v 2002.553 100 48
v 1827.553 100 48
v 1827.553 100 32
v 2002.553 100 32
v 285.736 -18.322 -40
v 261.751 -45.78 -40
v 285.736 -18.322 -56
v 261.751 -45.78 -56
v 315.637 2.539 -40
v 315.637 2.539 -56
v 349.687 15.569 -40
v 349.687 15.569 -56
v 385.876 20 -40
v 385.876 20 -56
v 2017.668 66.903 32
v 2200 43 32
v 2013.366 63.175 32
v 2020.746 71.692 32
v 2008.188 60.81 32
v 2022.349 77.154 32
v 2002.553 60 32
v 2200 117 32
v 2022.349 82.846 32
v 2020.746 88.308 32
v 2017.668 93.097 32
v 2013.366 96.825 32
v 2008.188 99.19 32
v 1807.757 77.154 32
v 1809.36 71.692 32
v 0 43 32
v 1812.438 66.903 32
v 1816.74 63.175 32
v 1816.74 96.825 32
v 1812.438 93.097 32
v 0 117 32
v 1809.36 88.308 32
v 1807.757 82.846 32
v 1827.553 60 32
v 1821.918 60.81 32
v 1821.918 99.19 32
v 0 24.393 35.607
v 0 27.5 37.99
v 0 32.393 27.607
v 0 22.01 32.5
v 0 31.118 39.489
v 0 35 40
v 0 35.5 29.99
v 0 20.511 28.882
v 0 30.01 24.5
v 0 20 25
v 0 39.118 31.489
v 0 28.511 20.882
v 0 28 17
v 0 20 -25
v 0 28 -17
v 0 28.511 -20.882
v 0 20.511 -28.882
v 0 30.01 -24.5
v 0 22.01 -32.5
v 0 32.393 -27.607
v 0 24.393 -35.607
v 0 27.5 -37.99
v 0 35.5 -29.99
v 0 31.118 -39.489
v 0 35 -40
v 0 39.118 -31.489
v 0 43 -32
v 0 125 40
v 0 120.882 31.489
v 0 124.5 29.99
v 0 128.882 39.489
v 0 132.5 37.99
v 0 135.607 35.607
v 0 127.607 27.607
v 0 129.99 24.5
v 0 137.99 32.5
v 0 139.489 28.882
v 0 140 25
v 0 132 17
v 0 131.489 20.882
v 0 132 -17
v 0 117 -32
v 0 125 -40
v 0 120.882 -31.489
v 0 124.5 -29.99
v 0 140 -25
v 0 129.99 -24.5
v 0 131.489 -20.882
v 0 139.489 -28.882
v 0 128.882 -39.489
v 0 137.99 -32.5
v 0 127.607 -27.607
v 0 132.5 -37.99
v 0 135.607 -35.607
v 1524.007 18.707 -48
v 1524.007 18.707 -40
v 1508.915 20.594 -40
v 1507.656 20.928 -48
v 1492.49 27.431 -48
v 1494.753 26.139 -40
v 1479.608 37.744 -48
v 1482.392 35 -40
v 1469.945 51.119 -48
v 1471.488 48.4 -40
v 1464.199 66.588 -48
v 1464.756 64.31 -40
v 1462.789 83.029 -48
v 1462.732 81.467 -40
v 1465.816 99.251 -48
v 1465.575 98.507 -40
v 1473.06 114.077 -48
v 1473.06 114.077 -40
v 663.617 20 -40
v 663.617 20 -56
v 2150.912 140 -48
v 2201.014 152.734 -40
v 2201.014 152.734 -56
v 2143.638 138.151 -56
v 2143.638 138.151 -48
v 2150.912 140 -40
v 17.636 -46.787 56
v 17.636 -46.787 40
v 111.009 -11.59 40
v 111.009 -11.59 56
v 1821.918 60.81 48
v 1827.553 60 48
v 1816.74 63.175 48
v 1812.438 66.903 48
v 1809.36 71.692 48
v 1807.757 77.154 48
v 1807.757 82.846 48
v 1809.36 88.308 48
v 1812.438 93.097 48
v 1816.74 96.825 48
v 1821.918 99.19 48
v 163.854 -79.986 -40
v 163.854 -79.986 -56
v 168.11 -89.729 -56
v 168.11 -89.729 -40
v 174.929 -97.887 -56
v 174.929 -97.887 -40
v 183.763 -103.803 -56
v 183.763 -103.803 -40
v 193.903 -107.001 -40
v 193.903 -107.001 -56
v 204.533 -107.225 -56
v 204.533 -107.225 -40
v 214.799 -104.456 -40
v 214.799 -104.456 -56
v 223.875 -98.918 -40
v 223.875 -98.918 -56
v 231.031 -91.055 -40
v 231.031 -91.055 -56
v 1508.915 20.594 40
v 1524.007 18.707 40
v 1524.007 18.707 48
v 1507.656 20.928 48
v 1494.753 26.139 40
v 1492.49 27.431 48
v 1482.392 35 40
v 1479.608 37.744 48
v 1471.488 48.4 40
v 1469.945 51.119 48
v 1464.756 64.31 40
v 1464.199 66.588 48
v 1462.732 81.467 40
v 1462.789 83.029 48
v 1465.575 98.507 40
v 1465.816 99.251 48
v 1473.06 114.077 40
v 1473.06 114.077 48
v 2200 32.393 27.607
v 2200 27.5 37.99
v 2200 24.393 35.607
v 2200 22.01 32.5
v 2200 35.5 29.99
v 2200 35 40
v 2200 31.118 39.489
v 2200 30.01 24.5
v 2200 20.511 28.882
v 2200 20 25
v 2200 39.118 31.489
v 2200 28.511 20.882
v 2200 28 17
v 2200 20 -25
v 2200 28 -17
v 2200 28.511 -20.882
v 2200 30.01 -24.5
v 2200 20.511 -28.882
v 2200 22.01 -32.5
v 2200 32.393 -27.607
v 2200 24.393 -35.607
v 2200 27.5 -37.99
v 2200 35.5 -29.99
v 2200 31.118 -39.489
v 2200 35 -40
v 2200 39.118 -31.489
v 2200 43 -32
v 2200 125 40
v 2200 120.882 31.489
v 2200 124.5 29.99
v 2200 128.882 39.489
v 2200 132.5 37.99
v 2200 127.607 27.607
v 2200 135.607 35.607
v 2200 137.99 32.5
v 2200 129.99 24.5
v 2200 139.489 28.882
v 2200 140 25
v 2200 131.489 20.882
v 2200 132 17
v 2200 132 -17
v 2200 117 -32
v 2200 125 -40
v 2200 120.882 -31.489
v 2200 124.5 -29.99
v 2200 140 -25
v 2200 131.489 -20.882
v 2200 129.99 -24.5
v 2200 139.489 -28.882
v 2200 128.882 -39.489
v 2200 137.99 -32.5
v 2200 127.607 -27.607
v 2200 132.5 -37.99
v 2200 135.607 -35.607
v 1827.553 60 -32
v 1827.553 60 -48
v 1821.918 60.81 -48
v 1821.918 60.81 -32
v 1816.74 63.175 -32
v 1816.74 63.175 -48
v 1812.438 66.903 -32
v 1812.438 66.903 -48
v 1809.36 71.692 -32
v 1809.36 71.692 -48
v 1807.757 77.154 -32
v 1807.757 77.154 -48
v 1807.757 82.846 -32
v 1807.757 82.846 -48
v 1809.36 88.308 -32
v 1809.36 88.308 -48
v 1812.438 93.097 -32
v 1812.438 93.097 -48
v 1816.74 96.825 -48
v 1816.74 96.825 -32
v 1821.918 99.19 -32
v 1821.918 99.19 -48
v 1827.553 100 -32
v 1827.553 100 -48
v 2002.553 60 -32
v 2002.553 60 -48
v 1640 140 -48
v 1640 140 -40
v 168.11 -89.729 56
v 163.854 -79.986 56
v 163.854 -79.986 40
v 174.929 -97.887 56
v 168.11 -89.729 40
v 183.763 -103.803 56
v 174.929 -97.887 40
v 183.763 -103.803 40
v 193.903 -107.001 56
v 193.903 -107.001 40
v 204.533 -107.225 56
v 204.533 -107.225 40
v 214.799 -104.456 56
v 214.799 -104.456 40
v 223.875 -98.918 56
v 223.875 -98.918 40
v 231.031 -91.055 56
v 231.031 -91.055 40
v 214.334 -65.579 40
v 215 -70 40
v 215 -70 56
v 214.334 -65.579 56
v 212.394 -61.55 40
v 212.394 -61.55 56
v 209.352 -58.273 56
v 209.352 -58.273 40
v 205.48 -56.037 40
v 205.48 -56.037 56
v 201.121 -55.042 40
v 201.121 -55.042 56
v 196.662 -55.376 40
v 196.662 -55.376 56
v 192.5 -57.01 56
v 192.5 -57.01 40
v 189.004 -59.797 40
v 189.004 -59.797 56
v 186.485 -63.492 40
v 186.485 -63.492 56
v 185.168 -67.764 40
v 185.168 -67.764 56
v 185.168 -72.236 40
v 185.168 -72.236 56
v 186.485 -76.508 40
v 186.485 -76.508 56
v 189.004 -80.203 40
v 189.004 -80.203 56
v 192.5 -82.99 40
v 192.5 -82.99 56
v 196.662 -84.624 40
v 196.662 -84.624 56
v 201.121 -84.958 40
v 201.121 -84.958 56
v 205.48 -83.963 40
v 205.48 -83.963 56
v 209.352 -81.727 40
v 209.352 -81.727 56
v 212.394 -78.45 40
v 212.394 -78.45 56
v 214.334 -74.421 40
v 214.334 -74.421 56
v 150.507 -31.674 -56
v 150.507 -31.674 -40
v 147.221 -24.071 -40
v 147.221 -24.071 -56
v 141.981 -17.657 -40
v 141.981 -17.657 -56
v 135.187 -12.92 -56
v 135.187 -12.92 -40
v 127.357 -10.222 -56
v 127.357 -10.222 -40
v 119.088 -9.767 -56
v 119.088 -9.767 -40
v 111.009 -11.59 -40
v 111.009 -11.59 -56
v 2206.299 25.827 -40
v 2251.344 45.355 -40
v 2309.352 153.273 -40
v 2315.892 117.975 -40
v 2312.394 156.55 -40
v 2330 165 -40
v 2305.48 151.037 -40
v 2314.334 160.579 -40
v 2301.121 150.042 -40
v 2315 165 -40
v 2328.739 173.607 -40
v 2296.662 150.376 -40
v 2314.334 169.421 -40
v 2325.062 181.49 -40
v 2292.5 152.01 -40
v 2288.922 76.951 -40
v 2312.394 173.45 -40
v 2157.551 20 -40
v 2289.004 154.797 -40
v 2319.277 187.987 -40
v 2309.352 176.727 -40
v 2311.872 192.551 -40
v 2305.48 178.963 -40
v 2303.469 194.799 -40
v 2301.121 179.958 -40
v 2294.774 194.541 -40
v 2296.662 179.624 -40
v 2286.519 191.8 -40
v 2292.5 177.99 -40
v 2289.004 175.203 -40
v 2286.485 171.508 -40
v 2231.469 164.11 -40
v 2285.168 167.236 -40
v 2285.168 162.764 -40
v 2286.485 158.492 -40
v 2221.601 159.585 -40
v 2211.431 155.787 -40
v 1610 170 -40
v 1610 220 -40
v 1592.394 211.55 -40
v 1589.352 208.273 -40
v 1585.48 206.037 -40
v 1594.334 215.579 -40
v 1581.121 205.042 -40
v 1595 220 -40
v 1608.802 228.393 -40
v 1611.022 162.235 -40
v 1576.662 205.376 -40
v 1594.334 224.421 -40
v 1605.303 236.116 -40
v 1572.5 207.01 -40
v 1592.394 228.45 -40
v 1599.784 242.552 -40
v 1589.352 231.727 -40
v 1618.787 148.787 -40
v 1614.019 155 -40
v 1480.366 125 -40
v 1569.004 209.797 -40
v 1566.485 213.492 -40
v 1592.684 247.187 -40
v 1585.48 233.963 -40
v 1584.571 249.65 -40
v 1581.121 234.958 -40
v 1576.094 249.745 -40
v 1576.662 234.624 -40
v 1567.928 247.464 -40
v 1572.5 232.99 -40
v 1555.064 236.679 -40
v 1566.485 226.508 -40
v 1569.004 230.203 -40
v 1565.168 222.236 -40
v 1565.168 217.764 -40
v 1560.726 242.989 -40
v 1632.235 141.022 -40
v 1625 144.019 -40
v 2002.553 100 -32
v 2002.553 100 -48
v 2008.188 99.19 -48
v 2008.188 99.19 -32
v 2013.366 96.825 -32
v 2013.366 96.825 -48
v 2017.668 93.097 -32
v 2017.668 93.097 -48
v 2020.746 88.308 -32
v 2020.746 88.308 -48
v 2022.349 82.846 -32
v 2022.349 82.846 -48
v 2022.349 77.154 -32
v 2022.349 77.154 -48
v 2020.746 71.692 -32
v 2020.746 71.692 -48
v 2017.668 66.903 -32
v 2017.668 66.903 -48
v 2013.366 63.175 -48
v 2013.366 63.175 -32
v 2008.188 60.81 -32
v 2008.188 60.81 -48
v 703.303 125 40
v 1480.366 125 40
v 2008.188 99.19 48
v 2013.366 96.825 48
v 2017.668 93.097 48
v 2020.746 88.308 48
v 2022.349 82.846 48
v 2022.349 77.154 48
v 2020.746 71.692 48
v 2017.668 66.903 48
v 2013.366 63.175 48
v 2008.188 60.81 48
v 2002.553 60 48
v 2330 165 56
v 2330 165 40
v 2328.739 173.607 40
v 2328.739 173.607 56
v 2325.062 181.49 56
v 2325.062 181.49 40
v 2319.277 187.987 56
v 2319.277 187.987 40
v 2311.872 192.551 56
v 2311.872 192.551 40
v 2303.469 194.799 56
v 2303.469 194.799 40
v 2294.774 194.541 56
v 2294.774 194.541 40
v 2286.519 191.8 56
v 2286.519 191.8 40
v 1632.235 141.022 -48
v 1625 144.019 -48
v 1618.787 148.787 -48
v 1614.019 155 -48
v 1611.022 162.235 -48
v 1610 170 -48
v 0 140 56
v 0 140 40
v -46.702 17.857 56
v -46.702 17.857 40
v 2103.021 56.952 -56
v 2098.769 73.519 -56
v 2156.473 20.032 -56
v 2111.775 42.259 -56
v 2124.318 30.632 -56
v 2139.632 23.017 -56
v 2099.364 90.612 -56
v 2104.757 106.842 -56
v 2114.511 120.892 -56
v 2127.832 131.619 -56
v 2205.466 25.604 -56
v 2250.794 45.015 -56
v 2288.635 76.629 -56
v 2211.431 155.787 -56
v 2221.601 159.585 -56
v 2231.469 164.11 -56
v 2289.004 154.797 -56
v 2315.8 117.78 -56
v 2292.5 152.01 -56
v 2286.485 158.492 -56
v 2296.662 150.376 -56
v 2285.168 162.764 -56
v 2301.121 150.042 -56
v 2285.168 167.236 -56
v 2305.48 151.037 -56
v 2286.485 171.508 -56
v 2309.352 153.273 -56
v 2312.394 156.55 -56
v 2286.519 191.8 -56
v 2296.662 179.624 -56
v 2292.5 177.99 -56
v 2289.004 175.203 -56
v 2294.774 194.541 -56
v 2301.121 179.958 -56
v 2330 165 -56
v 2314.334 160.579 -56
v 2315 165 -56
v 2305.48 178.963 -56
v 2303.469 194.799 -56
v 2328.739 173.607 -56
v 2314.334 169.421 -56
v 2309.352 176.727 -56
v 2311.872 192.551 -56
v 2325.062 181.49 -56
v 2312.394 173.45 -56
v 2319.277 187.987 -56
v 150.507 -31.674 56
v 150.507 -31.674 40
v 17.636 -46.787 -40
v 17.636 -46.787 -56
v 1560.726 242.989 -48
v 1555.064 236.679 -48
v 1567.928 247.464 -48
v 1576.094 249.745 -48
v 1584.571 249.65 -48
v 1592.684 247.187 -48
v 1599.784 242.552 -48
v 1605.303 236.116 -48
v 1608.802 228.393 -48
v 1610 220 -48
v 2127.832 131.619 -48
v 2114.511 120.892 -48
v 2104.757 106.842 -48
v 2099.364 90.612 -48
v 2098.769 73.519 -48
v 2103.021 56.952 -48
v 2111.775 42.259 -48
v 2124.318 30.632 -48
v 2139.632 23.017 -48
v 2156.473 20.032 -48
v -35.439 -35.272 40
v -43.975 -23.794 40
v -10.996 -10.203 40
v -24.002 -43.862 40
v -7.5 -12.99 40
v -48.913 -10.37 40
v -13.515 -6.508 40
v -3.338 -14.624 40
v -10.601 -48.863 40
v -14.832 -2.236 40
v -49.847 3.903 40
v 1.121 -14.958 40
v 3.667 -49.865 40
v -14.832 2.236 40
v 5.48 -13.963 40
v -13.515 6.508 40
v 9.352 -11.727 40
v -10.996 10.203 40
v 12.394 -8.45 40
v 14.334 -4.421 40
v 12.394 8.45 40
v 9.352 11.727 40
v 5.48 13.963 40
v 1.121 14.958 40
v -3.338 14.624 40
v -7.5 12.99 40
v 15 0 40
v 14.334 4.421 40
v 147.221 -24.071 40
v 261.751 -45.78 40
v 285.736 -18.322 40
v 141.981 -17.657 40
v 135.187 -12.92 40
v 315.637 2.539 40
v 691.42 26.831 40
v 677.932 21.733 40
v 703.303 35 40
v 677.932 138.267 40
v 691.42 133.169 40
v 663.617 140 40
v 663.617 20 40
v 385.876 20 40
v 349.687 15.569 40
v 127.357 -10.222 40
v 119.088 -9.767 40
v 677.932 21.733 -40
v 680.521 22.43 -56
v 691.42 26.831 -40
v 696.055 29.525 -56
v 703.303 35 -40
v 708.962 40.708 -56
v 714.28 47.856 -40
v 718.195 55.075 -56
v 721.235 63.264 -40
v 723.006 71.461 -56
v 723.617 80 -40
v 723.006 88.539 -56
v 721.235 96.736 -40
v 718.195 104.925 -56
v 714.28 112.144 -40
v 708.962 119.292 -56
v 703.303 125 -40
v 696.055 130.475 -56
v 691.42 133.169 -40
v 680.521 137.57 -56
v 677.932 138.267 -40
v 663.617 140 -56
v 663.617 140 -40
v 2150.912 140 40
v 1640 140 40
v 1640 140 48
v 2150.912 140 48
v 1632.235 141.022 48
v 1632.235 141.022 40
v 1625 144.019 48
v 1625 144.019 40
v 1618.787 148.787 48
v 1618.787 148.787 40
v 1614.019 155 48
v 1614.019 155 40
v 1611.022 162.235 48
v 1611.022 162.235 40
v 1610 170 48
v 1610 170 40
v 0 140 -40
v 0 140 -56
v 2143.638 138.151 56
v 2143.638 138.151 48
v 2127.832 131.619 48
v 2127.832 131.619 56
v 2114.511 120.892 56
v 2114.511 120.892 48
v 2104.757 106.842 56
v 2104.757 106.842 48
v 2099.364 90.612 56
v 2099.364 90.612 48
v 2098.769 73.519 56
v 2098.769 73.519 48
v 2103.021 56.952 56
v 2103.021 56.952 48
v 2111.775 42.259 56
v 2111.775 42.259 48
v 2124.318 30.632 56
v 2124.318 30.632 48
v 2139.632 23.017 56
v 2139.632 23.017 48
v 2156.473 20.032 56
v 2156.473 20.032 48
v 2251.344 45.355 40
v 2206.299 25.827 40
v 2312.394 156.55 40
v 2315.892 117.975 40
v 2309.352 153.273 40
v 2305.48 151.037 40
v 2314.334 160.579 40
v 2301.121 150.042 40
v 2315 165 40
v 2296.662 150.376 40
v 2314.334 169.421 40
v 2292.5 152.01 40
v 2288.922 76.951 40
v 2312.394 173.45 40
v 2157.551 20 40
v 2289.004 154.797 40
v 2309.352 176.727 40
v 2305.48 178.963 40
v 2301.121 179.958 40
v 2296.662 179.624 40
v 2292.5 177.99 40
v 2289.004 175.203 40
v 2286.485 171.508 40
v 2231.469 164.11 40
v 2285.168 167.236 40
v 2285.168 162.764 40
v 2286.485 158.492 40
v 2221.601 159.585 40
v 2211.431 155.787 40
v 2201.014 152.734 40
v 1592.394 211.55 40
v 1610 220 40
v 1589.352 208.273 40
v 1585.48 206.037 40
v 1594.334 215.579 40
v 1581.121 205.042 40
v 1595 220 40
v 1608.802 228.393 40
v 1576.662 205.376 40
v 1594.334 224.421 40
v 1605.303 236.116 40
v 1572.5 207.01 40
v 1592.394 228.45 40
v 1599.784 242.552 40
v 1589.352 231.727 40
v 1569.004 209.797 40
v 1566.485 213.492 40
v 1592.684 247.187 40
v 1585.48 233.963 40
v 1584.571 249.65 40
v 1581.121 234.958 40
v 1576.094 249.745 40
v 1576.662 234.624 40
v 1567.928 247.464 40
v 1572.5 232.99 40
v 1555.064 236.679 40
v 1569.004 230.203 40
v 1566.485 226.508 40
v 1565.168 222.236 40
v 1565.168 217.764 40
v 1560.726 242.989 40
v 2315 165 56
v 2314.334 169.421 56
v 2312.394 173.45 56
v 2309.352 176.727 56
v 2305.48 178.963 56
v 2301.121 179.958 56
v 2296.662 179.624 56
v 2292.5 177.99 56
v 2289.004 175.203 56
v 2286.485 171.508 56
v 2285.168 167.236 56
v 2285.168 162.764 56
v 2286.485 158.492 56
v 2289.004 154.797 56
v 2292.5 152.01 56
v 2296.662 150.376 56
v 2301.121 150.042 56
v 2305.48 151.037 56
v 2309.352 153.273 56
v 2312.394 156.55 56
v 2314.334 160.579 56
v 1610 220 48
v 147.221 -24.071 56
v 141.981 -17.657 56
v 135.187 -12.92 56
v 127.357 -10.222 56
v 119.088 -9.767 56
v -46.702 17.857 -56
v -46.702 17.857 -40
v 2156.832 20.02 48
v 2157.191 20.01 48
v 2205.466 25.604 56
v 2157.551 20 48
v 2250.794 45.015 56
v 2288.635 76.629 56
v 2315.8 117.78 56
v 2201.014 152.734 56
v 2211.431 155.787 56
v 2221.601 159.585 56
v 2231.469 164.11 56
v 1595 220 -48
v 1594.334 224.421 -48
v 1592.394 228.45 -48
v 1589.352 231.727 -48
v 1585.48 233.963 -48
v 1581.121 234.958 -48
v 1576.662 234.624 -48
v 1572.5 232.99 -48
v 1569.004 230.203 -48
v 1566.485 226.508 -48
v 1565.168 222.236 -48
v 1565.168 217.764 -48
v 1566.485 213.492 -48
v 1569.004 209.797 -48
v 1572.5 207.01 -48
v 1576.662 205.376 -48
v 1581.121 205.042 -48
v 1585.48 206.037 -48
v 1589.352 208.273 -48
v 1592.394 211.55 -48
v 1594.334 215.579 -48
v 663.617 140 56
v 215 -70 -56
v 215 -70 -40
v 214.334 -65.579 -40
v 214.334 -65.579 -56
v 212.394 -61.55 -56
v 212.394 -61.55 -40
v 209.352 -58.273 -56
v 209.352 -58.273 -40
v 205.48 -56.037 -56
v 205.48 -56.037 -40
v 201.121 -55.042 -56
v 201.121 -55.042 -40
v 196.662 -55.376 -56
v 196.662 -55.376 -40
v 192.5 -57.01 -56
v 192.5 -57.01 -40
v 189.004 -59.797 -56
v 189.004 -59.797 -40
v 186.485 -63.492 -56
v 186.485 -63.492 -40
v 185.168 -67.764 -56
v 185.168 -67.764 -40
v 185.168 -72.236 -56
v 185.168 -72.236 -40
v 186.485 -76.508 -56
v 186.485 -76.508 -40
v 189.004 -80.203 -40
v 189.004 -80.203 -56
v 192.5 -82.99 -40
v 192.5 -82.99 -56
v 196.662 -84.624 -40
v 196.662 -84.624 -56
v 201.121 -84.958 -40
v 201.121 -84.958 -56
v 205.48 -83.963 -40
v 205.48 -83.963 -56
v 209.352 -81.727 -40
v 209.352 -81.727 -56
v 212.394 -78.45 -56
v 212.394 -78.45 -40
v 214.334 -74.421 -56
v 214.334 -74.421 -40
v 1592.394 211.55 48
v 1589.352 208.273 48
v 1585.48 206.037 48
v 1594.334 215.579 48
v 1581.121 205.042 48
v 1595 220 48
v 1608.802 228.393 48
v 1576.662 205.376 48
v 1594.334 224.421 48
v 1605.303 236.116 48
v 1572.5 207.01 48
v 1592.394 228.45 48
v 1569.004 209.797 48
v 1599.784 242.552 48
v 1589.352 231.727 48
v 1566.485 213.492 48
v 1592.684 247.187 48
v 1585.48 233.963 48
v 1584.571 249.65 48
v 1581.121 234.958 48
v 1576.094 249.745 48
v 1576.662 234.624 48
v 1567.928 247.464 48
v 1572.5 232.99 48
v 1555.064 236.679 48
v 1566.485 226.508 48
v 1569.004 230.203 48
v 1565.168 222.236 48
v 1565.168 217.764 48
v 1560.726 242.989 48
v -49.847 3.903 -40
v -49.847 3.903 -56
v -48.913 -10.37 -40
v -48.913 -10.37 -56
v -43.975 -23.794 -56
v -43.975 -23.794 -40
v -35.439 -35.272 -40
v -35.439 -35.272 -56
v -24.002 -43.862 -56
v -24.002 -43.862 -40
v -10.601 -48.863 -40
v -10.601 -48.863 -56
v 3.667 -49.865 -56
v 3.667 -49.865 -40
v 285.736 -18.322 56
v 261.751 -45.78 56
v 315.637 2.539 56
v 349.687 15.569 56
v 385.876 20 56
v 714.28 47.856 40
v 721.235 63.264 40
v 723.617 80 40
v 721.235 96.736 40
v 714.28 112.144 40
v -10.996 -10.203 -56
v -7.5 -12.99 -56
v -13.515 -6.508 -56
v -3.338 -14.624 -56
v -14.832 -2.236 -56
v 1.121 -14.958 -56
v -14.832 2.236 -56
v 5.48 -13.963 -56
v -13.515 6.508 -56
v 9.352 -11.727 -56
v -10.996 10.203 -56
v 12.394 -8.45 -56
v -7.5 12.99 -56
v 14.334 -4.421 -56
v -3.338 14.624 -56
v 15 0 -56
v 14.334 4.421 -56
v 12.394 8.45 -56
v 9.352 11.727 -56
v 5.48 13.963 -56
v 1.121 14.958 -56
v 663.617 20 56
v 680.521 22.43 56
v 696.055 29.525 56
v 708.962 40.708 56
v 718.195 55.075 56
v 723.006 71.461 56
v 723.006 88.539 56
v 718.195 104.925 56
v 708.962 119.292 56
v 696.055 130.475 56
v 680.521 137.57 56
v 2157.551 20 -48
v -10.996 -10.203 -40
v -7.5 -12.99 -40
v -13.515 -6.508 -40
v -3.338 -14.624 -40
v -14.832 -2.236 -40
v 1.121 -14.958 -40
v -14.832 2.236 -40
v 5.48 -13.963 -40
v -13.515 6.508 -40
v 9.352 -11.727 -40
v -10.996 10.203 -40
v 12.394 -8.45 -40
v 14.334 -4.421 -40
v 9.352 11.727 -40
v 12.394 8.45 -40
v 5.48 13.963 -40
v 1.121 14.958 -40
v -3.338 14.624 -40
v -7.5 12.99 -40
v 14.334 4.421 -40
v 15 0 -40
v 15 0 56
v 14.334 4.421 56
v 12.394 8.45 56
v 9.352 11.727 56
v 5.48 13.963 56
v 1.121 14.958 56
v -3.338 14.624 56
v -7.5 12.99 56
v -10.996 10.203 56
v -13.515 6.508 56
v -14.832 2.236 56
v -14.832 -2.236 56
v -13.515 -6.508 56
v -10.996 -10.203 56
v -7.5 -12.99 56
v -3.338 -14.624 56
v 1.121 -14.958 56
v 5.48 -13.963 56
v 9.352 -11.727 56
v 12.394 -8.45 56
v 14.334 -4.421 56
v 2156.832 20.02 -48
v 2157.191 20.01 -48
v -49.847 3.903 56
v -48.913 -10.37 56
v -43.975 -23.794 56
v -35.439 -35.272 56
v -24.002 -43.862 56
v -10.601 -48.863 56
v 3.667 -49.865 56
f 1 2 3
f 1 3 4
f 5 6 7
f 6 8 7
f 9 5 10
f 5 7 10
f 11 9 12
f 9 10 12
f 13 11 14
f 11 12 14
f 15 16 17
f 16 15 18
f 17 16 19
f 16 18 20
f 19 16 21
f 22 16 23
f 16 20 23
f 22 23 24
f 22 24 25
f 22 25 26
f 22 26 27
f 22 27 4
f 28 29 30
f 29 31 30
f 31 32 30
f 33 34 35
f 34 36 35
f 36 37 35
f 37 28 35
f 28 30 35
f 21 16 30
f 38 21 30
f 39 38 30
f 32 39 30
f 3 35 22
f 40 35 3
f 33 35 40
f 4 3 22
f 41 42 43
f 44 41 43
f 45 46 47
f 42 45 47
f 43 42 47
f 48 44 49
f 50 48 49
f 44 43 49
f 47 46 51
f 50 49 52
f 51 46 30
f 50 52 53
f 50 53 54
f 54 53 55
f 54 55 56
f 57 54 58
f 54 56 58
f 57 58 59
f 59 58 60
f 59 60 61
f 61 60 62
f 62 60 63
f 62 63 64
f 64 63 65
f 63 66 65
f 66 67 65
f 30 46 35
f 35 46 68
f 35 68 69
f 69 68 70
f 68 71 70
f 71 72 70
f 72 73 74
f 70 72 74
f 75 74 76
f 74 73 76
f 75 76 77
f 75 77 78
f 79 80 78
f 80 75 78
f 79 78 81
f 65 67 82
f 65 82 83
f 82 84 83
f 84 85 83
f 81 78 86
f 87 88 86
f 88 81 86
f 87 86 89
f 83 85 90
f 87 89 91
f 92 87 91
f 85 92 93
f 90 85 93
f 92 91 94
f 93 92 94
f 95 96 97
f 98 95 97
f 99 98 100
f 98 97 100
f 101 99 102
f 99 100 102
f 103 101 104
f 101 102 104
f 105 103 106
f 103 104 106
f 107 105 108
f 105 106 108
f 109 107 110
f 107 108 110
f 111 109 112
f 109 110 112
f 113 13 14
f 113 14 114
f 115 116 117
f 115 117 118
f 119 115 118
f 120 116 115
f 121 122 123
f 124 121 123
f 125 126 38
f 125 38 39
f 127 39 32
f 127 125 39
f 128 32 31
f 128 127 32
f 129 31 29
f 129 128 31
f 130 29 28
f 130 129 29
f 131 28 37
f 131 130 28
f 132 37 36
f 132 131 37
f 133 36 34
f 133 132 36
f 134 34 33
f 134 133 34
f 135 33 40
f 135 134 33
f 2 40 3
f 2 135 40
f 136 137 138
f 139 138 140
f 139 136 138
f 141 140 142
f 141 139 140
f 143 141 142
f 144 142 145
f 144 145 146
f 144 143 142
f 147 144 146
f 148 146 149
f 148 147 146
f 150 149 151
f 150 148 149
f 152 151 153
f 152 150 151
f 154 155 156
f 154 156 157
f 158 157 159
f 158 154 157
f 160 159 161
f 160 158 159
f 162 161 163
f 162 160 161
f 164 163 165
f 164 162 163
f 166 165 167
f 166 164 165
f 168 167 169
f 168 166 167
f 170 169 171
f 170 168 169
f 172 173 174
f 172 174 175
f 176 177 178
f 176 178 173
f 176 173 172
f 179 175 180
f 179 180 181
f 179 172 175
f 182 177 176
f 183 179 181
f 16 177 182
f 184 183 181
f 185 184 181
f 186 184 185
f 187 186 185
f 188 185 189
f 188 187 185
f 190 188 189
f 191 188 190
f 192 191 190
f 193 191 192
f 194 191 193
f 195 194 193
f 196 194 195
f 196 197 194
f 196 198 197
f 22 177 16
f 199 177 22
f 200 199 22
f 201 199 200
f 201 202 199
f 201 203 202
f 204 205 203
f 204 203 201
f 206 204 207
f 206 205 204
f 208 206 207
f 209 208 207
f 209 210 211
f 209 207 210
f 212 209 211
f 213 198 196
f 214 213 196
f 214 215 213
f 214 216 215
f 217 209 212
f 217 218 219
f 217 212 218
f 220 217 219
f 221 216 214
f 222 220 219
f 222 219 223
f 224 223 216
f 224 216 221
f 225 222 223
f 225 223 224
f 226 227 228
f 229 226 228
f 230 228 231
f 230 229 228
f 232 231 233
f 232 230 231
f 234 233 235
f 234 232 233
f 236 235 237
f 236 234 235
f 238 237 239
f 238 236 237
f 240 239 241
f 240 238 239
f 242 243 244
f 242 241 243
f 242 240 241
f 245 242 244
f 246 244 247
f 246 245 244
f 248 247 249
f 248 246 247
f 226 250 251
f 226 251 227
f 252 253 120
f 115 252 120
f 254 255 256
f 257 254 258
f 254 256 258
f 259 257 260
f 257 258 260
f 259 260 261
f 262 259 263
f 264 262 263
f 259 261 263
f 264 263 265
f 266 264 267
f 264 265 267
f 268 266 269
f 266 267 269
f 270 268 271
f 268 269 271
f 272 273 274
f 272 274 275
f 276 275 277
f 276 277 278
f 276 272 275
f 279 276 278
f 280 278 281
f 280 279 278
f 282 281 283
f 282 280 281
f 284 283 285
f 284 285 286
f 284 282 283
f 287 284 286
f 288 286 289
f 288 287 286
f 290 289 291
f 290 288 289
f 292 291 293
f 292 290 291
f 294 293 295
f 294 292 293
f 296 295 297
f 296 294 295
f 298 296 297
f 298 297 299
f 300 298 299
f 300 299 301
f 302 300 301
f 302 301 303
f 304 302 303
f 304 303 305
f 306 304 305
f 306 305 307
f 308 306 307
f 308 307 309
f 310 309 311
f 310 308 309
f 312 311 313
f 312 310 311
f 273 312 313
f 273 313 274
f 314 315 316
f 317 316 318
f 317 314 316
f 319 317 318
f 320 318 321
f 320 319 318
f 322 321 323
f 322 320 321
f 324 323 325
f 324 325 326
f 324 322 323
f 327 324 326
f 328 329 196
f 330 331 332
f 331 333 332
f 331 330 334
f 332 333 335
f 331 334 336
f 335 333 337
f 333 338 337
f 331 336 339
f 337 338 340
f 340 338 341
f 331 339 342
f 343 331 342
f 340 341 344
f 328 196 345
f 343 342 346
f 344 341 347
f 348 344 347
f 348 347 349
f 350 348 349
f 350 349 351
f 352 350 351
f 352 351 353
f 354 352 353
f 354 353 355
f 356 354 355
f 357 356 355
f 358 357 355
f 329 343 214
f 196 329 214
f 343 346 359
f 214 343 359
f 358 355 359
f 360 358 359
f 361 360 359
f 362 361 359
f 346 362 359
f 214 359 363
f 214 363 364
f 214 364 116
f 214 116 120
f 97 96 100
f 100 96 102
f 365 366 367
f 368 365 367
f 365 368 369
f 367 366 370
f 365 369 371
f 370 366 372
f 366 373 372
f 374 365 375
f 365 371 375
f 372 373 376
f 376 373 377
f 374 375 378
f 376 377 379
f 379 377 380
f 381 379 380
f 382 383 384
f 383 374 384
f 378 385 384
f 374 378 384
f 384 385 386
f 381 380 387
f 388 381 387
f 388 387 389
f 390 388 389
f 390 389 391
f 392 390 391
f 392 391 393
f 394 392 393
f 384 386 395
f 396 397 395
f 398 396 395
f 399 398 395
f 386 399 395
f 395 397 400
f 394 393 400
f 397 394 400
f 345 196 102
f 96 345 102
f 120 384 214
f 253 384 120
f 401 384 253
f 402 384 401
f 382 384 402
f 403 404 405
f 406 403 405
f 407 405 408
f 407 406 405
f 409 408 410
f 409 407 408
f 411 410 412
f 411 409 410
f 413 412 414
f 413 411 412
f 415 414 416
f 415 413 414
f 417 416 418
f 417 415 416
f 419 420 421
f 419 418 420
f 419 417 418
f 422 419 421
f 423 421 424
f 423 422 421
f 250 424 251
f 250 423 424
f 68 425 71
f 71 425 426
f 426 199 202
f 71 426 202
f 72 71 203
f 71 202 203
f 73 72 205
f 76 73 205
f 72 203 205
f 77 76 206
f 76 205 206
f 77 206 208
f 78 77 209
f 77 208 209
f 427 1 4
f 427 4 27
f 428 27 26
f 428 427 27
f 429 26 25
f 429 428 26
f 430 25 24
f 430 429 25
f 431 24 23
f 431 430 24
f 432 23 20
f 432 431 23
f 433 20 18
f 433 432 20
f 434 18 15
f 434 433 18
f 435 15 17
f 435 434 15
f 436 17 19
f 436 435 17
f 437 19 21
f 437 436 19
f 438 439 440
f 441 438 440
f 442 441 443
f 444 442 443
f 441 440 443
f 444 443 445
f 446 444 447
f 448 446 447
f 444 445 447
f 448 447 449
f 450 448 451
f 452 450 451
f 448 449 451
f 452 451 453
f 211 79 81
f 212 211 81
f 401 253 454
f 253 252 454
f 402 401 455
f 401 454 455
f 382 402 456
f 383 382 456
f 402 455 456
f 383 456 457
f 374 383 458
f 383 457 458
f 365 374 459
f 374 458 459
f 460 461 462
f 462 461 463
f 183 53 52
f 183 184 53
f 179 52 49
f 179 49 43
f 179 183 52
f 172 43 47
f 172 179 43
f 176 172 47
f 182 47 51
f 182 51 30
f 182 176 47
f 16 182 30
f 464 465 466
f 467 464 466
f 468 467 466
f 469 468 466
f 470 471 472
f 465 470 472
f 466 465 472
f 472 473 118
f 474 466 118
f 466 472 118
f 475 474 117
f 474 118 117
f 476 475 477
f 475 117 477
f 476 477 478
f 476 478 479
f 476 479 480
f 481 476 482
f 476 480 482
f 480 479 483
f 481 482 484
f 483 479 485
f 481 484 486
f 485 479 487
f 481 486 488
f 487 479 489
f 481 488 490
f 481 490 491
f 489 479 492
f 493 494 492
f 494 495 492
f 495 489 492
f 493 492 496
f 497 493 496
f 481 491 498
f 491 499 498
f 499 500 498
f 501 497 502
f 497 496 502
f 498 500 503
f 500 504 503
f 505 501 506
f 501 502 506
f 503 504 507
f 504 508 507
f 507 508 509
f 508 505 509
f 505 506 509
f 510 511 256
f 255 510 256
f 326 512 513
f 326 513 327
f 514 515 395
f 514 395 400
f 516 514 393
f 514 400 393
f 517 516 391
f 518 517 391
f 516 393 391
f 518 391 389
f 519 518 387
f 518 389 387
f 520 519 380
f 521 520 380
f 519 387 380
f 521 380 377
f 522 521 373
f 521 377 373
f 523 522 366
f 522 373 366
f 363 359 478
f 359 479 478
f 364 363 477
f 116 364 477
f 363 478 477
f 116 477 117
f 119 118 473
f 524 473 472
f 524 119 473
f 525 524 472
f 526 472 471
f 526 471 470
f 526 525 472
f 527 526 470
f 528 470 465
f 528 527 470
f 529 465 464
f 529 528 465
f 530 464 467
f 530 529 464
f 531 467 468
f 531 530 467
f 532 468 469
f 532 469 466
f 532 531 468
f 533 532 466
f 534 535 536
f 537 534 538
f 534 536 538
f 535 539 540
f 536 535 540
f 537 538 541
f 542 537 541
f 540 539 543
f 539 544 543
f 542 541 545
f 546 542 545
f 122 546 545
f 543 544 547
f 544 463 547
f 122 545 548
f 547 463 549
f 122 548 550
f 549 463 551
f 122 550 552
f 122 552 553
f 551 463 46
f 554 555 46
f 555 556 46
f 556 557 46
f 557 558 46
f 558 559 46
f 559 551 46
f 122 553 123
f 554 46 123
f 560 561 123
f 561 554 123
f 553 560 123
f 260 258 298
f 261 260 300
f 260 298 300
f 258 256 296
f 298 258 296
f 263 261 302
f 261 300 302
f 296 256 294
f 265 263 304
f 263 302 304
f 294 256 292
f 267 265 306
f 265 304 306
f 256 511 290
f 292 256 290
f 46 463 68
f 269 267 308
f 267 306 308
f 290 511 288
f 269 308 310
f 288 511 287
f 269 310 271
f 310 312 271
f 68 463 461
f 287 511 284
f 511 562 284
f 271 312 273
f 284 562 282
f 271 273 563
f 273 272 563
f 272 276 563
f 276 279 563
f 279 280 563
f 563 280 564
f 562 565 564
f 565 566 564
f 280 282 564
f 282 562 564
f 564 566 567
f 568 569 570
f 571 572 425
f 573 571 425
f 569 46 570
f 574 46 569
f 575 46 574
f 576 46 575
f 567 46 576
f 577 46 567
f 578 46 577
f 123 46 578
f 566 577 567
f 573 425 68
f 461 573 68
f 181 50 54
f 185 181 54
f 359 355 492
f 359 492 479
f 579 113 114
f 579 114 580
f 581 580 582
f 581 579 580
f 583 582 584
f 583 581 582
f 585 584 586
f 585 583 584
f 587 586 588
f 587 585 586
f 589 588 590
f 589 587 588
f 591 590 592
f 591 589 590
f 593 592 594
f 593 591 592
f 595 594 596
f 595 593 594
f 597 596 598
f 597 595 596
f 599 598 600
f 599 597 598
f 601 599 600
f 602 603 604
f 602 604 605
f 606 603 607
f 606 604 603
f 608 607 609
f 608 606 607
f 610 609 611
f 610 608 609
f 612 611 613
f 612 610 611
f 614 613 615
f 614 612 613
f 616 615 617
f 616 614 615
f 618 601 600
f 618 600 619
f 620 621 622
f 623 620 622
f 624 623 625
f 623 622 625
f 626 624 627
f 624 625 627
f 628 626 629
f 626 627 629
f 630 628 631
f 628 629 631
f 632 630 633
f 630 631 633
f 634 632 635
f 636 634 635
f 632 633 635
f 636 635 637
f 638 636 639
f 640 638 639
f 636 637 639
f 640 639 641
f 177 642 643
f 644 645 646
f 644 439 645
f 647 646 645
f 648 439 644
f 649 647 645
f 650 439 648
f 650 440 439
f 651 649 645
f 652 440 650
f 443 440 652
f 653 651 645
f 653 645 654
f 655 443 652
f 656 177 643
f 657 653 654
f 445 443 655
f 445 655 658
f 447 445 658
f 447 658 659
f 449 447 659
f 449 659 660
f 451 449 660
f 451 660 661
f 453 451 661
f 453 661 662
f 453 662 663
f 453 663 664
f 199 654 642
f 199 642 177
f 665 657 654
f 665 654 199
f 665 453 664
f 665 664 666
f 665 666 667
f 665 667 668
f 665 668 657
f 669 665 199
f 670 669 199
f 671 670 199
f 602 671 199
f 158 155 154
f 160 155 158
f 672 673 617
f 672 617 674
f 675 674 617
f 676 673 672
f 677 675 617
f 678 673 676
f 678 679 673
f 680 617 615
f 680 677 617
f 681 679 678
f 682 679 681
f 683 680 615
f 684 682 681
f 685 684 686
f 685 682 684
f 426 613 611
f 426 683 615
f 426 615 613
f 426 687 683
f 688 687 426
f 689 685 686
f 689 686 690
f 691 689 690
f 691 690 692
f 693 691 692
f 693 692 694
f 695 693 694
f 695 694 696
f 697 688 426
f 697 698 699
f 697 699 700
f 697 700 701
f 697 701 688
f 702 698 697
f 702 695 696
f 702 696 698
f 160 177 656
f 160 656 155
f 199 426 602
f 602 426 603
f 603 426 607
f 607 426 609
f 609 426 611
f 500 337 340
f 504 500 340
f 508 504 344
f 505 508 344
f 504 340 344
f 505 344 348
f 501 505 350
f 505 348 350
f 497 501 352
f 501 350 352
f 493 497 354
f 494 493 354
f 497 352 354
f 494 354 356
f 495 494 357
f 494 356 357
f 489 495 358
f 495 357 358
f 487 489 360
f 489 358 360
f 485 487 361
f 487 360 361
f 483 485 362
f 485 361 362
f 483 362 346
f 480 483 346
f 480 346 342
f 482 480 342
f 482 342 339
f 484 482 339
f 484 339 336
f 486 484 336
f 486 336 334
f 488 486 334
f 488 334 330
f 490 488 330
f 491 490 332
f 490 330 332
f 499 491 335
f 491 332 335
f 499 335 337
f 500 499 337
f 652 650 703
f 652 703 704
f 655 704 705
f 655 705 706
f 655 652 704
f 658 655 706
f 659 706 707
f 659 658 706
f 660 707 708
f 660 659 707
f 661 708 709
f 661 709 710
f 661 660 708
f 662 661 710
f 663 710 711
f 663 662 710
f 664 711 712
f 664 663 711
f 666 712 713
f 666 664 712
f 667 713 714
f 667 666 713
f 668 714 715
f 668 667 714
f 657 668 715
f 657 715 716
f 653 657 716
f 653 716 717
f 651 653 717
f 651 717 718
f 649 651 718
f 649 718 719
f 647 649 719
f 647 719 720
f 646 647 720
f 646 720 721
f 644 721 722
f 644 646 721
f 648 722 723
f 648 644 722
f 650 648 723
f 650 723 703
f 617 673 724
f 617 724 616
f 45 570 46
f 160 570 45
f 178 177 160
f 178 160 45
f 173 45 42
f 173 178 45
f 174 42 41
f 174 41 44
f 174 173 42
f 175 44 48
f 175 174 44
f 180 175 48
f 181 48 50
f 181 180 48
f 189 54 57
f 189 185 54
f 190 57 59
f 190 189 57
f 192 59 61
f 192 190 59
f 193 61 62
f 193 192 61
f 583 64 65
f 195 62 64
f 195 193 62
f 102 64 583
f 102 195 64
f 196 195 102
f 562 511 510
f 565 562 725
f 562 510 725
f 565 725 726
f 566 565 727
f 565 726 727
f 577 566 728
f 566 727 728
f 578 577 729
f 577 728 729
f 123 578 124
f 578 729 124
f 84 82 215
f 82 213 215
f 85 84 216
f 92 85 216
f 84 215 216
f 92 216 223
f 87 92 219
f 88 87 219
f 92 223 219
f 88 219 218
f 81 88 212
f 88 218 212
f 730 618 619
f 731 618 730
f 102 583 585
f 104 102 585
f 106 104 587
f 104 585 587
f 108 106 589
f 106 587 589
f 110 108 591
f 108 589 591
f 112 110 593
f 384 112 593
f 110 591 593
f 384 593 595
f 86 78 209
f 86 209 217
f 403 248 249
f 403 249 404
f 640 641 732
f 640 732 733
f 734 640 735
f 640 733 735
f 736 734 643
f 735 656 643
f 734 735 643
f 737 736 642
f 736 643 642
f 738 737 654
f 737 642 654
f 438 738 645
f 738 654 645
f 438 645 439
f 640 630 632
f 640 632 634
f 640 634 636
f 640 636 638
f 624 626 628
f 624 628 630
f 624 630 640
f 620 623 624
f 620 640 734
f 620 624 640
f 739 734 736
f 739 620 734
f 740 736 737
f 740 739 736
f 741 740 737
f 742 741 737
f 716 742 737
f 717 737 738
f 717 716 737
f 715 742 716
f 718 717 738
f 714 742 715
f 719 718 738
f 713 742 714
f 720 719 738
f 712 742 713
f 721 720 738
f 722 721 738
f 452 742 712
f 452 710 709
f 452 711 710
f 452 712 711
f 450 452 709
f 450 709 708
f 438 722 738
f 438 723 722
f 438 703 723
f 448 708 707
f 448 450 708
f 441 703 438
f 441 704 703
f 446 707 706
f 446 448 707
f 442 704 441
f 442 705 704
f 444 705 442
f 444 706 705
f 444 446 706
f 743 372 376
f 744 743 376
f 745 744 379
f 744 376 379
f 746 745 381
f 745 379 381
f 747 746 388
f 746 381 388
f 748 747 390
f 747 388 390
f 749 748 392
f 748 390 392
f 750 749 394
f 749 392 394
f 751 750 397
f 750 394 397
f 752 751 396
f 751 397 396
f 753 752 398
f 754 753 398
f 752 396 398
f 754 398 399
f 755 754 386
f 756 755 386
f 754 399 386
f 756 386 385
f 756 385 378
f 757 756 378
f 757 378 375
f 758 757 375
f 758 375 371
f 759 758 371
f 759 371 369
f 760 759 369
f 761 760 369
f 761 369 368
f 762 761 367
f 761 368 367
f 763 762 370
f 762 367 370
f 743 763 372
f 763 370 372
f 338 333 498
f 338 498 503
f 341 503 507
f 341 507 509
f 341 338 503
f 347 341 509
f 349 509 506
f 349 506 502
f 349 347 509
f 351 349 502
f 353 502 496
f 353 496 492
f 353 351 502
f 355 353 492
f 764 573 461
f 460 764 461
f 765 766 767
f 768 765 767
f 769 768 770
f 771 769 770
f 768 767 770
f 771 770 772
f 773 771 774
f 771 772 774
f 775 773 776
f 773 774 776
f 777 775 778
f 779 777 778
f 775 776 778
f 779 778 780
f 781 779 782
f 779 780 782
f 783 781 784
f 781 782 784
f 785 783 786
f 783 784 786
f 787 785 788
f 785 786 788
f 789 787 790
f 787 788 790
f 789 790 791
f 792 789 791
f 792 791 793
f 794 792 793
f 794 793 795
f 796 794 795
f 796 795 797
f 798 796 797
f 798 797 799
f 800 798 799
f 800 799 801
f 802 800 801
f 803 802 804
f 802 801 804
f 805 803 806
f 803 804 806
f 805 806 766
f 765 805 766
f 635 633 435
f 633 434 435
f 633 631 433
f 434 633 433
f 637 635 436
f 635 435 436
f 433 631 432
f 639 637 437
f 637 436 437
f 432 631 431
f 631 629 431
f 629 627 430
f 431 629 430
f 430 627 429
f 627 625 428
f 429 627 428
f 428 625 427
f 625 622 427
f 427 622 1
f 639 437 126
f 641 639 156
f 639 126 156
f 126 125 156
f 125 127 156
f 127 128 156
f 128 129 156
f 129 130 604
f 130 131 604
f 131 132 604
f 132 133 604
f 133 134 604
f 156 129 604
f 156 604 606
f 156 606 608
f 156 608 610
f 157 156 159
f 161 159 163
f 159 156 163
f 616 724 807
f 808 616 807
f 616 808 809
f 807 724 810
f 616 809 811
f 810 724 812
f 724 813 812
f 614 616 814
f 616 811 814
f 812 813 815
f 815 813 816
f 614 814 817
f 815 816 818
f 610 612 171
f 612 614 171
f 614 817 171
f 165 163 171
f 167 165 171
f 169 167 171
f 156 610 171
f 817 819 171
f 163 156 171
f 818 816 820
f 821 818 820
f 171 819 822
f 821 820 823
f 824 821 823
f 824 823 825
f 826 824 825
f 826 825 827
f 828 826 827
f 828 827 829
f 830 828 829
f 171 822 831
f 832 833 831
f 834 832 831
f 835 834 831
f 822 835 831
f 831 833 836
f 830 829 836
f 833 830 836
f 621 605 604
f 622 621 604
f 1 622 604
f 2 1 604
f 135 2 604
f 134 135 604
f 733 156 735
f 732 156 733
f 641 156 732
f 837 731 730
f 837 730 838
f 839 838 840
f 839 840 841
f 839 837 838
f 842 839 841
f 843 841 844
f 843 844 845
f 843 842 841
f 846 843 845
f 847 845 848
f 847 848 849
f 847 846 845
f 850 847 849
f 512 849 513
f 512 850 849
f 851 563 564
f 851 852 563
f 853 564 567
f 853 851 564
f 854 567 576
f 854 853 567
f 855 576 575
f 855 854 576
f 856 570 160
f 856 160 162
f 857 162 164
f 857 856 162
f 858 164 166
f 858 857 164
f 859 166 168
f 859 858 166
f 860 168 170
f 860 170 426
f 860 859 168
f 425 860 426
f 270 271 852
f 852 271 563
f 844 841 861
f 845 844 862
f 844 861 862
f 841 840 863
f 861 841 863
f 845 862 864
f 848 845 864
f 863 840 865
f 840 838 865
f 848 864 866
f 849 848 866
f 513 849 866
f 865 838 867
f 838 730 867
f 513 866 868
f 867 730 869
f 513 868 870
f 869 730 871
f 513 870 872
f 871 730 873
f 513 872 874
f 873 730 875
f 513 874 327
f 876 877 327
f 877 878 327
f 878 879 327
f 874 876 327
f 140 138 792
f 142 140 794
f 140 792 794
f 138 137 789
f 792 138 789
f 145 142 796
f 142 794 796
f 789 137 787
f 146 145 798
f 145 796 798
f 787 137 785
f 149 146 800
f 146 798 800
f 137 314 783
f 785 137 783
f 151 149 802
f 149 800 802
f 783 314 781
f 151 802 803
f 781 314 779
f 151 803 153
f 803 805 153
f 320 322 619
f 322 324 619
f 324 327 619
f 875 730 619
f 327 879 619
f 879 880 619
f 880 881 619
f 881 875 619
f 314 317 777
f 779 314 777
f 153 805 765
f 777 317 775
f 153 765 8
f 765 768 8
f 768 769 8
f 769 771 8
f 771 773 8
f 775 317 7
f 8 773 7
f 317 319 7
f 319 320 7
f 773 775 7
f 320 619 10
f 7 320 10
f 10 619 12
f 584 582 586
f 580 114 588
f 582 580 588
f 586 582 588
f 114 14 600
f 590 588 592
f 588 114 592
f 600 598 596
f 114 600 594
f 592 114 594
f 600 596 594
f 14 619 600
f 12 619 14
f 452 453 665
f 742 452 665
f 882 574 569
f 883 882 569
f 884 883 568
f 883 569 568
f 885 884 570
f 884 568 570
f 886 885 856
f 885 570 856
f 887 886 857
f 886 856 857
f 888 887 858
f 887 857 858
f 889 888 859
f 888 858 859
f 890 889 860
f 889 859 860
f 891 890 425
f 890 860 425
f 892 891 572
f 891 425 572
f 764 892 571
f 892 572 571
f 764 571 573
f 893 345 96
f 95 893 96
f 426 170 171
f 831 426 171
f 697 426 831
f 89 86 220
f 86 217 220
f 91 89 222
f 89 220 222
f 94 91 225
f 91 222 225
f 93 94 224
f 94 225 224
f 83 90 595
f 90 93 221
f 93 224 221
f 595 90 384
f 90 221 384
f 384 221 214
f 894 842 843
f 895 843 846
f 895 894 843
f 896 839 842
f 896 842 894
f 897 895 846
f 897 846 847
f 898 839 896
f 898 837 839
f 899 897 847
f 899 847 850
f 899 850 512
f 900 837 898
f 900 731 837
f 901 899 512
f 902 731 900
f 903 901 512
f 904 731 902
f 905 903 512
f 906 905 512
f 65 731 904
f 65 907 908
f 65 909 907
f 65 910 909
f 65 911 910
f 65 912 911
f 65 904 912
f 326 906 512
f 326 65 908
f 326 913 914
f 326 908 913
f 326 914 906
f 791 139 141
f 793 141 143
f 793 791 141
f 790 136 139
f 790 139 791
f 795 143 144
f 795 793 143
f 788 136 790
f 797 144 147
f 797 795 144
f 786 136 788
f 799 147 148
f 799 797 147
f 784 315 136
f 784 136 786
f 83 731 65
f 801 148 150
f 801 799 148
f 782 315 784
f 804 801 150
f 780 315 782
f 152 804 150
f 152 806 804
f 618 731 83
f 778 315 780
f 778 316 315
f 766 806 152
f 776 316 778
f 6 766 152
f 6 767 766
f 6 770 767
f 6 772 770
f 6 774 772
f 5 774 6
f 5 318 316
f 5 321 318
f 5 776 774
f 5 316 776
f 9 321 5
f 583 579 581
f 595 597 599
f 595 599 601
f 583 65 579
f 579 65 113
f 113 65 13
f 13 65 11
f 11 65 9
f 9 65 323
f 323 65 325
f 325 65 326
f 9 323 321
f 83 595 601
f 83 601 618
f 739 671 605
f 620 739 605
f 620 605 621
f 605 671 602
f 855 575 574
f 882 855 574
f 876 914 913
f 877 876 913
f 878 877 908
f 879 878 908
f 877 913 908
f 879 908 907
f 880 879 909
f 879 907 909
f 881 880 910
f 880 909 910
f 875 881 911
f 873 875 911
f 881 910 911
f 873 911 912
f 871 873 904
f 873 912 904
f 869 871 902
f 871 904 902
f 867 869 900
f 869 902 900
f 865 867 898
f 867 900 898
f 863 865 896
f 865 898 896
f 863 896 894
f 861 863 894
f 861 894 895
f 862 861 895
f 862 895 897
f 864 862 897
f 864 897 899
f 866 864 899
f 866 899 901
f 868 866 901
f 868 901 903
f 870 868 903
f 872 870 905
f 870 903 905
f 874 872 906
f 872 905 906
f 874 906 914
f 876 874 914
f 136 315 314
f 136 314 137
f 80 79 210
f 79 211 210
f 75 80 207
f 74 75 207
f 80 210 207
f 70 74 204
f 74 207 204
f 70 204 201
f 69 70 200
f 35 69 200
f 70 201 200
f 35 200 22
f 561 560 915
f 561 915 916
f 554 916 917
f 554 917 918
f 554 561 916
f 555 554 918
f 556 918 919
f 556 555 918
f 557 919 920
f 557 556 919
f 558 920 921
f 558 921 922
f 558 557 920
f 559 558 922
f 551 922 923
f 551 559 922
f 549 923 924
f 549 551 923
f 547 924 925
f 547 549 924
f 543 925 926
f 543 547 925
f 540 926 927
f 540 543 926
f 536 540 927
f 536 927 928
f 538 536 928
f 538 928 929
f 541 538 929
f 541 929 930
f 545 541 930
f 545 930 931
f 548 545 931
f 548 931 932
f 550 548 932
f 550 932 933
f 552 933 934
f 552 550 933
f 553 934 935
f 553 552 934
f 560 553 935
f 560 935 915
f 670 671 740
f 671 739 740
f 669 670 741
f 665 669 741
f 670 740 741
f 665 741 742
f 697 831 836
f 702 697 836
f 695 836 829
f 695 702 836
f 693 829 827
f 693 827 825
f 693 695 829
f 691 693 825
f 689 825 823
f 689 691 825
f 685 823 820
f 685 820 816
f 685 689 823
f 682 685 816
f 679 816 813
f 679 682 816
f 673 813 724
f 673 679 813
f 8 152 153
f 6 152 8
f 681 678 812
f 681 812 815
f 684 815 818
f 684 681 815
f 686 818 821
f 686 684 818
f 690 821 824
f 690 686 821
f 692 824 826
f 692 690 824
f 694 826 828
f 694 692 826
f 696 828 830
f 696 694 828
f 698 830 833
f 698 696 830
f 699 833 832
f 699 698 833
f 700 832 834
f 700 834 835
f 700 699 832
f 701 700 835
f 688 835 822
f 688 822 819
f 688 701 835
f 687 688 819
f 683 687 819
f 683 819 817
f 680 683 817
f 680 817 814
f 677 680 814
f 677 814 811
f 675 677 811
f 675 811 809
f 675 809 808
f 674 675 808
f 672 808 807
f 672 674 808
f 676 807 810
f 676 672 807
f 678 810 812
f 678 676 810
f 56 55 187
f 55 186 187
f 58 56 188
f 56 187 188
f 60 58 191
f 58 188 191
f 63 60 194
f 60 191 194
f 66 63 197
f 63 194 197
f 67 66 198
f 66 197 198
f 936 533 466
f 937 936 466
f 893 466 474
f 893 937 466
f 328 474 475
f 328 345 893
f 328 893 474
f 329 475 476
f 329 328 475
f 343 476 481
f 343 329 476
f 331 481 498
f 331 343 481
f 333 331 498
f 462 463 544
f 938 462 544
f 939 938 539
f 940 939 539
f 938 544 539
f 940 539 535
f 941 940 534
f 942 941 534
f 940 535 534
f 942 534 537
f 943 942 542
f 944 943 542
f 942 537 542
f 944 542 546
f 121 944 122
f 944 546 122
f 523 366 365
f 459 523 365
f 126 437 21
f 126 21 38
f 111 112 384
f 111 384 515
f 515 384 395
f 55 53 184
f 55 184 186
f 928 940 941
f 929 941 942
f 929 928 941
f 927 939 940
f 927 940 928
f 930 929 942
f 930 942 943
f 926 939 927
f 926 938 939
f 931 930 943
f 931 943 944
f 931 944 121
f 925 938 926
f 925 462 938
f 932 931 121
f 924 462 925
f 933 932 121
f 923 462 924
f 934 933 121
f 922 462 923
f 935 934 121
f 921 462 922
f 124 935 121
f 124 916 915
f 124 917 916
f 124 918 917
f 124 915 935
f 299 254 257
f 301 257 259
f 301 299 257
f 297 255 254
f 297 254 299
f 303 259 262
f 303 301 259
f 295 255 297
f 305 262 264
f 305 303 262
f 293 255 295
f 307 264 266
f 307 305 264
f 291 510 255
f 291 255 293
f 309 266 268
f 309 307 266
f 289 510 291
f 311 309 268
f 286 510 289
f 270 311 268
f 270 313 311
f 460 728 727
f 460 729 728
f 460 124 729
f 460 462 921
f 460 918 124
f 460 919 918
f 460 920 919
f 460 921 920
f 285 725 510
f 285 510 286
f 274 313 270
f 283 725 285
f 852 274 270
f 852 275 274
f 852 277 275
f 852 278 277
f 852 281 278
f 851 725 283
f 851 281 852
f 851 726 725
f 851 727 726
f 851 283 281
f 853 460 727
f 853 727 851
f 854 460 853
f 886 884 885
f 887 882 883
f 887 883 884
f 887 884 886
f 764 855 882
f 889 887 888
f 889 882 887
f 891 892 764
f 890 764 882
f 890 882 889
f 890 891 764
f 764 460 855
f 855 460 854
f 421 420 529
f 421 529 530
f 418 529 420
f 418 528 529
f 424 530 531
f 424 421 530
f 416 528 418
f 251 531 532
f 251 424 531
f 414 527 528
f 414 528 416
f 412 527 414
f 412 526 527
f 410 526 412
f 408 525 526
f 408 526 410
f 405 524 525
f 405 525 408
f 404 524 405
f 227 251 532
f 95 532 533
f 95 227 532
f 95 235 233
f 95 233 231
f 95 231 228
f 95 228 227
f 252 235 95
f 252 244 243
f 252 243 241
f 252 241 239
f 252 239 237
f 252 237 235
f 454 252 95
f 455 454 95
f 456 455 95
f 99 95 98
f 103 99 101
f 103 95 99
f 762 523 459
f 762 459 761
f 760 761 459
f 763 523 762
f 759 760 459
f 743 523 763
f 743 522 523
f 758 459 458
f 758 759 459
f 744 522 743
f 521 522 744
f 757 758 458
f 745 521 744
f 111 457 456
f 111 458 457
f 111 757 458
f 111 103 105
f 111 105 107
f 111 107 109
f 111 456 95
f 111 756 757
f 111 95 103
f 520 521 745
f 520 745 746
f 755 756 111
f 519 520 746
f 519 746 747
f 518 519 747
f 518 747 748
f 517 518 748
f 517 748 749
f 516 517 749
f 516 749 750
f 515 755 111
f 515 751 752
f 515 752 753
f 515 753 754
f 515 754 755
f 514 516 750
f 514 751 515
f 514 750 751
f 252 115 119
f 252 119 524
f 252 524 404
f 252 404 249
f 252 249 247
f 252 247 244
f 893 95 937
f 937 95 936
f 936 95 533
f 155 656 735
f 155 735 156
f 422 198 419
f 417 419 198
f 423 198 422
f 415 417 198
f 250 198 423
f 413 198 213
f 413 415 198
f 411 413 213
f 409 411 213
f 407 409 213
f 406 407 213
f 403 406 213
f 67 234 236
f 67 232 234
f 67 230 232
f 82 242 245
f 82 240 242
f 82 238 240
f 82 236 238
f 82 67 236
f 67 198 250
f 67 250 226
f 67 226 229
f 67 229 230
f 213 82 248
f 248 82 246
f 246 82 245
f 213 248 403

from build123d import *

# Parameters (mm, degrees)
SKETCH2_W               = 80
SKETCH2_H               = 120
SKETCH2_W_2             = 64
SKETCH2_H_2             = 104
BOSS_EXTRUDE1_DEPTH     = 2200
FILLET4_R               = 15
SKETCH4_R               = 15
BOSS_EXTRUDE2_DEPTH     = 16
FILLET1_R               = 30
FILLET2_R               = 150
FILLET1_OF_MIRROR1_R    = 30
FILLET2_OF_MIRROR1_R    = 150
SKETCH5_R               = 15
BOSS_EXTRUDE3_DEPTH     = 16
FILLET3_R               = 150
SKETCH9_R               = 15
BOSS_EXTRUDE4_DEPTH     = 8
FILLET5_R               = 30
FILLET3_OF_MIRROR5_R    = 150
FILLET5_OF_MIRROR5_R    = 30
CUT_EXTRUDE1_DEPTH      = 17
CUT_EXTRUDE1_DEPTH_BACK = 97


with BuildPart() as part:
    # Sketch2 → Boss-Extrude1 (new body)
    with BuildSketch(Plane(origin=(0, 0, 0), x_dir=(0, 0, -1), z_dir=(1, 0, 0))):
        with Locations((0, 80)):
            Rectangle(SKETCH2_W, SKETCH2_H)
        with Locations((0, 80)):
            Rectangle(SKETCH2_W_2, SKETCH2_H_2, mode=Mode.SUBTRACT)
    extrude(amount=BOSS_EXTRUDE1_DEPTH)

    # Fillet4
    fillet4_edges = [part.edges().sort_by_distance(p)[0] for p in [
        (1100, 132, 32),
        (1100, 28, 32),
        (1100, 28, -32),
        (1100, 132, -32),
        (1100, 20, -40),
        (1100, 20, 40),
        (1100, 140, 40),
        (1100, 140, -40),
    ]]
    fillet(fillet4_edges, radius=FILLET4_R)

    # Sketch4 → Boss-Extrude2 (add)
    with BuildSketch(Plane.XY.offset(40)):
        with BuildLine():
            Line((663.616754147, 140), (0, 140))
            Line((0, 140), (-46.702488681, 17.857142857))
            ThreePointArc((-46.702488681, 17.857142857), (-35.438939598, -35.271540371), (17.635818001, -46.786514333))
            Line((17.635818001, -46.786514333), (141.756963012, 0))
            Line((141.756963012, 0), (163.853984354, -79.985767518))
            ThreePointArc((163.853984354, -79.985767518), (193.903117134, -107.0010543), (231.031250542, -91.054963543))
            Line((231.031250542, -91.054963543), (306.382973978, 20))
            Line((306.382973978, 20), (663.616754147, 20))
            ThreePointArc((663.616754147, 20), (723.616754147, 80), (663.616754147, 140))
        make_face()
        Circle(SKETCH4_R, mode=Mode.SUBTRACT)
        with Locations((200, -70)):
            Circle(SKETCH4_R, mode=Mode.SUBTRACT)
    boss_extrude2 = extrude(amount=BOSS_EXTRUDE2_DEPTH)

    # Fillet1
    fillet1_edges = [part.edges().sort_by_distance(p)[0] for p in [
        (141.756963012, 0, 48),
    ]]
    fillet(fillet1_edges, radius=FILLET1_R)

    # Fillet2
    fillet2_edges = [part.edges().sort_by_distance(p)[0] for p in [
        (306.382973978, 20, 48),
    ]]
    fillet(fillet2_edges, radius=FILLET2_R)

    # Mirror1: Boss-Extrude2 across plane
    add(boss_extrude2.mirror(Plane(origin=(0, 0, 0), x_dir=(1, 0, 0), z_dir=(0, 0, -1))))

    # Fillet1 of Mirror1
    fillet1_of_mirror1_edges = [part.edges().sort_by_distance(p)[0] for p in [
        (141.756963012, 0, -48),
    ]]
    fillet(fillet1_of_mirror1_edges, radius=FILLET1_OF_MIRROR1_R)

    # Fillet2 of Mirror1
    fillet2_of_mirror1_edges = [part.edges().sort_by_distance(p)[0] for p in [
        (306.382973978, 20, -48),
    ]]
    fillet(fillet2_of_mirror1_edges, radius=FILLET2_OF_MIRROR1_R)



with BuildPart() as body_2:
    # Sketch5 → Boss-Extrude3 (new body)
    with BuildSketch(Plane.XY.offset(40)):
        with BuildLine():
            ThreePointArc((2156.472909481, 20.031536396), (2270.867590896, 59.441328796), (2330, 165))
            ThreePointArc((2330, 165), (2315.741185035, 190.538502182), (2286.518993754, 191.800419224))
            Line((2286.518993754, 191.800419224), (2216.86153125, 156.761687956))
            Line((2216.86153125, 156.761687956), (2143.638230406, 138.15116888))
            ThreePointArc((2143.638230406, 138.15116888), (2098.769091881, 73.518650853), (2156.472909481, 20.031536396))
        make_face()
        with Locations((2300, 165)):
            Circle(SKETCH5_R, mode=Mode.SUBTRACT)
    boss_extrude3 = extrude(amount=BOSS_EXTRUDE3_DEPTH)

    # Fillet3
    fillet3_edges = [body_2.edges().sort_by_distance(p)[0] for p in [
        (2216.86153125, 156.761687956, 48),
    ]]
    fillet(fillet3_edges, radius=FILLET3_R)


with BuildPart() as part_1:
    add(part.part)

    add(body_2.part)  # Boss-Extrude4 merges body 2
    # Sketch9 → Boss-Extrude4 (add)
    with BuildSketch(Plane.XY.offset(40)):
        with BuildLine():
            Line((1610, 140), (2157.550798688, 140))
            Line((2157.550798688, 140), (2157.550798688, 20))
            Line((2157.550798688, 20), (1524.006966774, 18.707022476))
            ThreePointArc((1524.006966774, 18.707022476), (1469.944566534, 51.119453365), (1473.059803349, 114.07661416))
            Line((1473.059803349, 114.07661416), (1555.063784392, 236.678883391))
            ThreePointArc((1555.063784392, 236.678883391), (1588.715317888, 248.706153245), (1610, 220))
            Line((1610, 220), (1610, 140))
        make_face()
        with Locations((1580, 220)):
            Circle(SKETCH9_R, mode=Mode.SUBTRACT)
    boss_extrude4 = extrude(amount=BOSS_EXTRUDE4_DEPTH)

    # Fillet5
    fillet5_edges = [part_1.edges().sort_by_distance(p)[0] for p in [
        (1610, 140, 44),
    ]]
    fillet(fillet5_edges, radius=FILLET5_R)

    # Mirror5: Boss-Extrude3, Boss-Extrude4 across plane
    add(boss_extrude3.mirror(Plane(origin=(0, 0, 0), x_dir=(1, 0, 0), z_dir=(0, 0, -1))))
    add(boss_extrude4.mirror(Plane(origin=(0, 0, 0), x_dir=(1, 0, 0), z_dir=(0, 0, -1))))

    # Fillet3 of Mirror5
    fillet3_of_mirror5_edges = [part_1.edges().sort_by_distance(p)[0] for p in [
        (2216.86153125, 156.761687956, -48),
    ]]
    fillet(fillet3_of_mirror5_edges, radius=FILLET3_OF_MIRROR5_R)

    # Fillet5 of Mirror5
    fillet5_of_mirror5_edges = [part_1.edges().sort_by_distance(p)[0] for p in [
        (1610, 140, -44),
    ]]
    fillet(fillet5_of_mirror5_edges, radius=FILLET5_OF_MIRROR5_R)

    # Sketch6 → Cut-Extrude1 (cut, two sides)
    with BuildSketch(Plane.XY.offset(40)) as cut_extrude1_sk:
        with BuildLine():
            Line((1827.553025368, 100), (2002.553025368, 100))
            ThreePointArc((2002.553025368, 100), (2022.553025368, 80), (2002.553025368, 60))
            Line((2002.553025368, 60), (1827.553025368, 60))
            ThreePointArc((1827.553025368, 60), (1807.553025368, 80), (1827.553025368, 100))
        make_face()
    extrude(amount=CUT_EXTRUDE1_DEPTH, mode=Mode.SUBTRACT)
    extrude(cut_extrude1_sk.sketch, amount=-CUT_EXTRUDE1_DEPTH_BACK, mode=Mode.SUBTRACT)


solid = part_1.part
